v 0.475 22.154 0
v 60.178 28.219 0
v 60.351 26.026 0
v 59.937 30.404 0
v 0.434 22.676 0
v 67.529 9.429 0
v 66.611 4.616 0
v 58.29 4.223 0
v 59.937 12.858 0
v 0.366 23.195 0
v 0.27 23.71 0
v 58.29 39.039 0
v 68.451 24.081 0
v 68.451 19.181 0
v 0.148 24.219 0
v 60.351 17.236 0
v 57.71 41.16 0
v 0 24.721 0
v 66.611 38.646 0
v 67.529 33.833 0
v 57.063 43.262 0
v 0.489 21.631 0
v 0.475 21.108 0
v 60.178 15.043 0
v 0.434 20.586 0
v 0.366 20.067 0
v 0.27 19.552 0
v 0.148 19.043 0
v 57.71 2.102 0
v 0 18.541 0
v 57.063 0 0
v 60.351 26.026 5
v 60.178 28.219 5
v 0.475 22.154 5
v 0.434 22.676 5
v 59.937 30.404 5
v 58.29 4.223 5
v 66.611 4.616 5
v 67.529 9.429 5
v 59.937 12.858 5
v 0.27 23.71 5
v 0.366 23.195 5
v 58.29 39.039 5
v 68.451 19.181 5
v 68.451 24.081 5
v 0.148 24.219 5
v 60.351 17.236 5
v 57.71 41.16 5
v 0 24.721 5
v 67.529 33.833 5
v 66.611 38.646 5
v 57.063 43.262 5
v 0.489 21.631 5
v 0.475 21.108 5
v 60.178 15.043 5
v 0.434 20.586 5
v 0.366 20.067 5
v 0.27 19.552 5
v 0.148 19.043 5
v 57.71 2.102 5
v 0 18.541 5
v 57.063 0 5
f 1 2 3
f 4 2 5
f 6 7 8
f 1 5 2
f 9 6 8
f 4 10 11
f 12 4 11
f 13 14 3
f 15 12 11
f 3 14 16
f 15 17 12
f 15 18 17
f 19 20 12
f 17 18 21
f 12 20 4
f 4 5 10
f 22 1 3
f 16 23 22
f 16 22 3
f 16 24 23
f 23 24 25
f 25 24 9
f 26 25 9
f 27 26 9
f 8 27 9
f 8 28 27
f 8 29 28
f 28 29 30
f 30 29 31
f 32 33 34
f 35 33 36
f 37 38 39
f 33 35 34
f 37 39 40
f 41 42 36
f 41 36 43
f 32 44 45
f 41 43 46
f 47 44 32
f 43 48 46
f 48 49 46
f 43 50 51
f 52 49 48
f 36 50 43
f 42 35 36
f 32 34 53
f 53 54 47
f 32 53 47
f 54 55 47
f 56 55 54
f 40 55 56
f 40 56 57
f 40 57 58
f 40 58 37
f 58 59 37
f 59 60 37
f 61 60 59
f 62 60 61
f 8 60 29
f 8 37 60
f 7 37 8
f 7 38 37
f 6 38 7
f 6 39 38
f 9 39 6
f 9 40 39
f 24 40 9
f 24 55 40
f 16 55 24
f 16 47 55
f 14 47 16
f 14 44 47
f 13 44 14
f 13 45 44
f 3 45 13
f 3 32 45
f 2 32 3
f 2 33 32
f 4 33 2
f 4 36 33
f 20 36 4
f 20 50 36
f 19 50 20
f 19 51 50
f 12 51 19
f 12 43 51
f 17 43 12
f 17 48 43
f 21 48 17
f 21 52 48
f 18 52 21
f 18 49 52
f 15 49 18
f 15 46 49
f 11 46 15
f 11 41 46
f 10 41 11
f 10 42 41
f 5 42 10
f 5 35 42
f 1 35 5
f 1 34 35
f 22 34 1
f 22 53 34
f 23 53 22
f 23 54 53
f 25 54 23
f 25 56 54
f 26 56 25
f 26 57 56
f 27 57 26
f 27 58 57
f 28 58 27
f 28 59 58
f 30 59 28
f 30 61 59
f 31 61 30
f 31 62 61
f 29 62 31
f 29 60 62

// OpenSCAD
$fn = 32;

// ----------------------------------------------------------------------
// Gear sector: 3 teeth on 36 degrees
// ----------------------------------------------------------------------

// --- parameters (mm) ---
sector_angle = 36;        // sector angle, degrees
root_r = 70;              // root circle radius
tooth_h = 8;              // tooth height over the root circle
teeth = 3;                // number of teeth on the sector
hub_r = 10;               // hub bore radius
plate_t = 5;              // sector thickness, Z
arc_step = 3;             // sampling step of the root/hub arcs, degrees

tip_r = root_r + tooth_h;  // tip circle radius

profile = [[57.063, 0], [57.71, 2.102], [58.29, 4.223], [66.611, 4.616], [67.529, 9.429], [59.937, 12.858], [60.178, 15.043], [60.351, 17.236], [68.451, 19.181], [68.451, 24.081], [60.351, 26.026], [60.178, 28.219], [59.937, 30.404], [67.529, 33.833], [66.611, 38.646], [58.29, 39.039], [57.71, 41.16], [57.063, 43.262], [0, 24.721], [0.148, 24.219], [0.27, 23.71], [0.366, 23.195], [0.434, 22.676], [0.475, 22.154], [0.489, 21.631], [0.475, 21.108], [0.434, 20.586], [0.366, 20.067], [0.27, 19.552], [0.148, 19.043], [0, 18.541]];  // primary outline, 31 points, counter clockwise

// --- the one profile operation ---
linear_extrude(height = plate_t) polygon(points = profile);
